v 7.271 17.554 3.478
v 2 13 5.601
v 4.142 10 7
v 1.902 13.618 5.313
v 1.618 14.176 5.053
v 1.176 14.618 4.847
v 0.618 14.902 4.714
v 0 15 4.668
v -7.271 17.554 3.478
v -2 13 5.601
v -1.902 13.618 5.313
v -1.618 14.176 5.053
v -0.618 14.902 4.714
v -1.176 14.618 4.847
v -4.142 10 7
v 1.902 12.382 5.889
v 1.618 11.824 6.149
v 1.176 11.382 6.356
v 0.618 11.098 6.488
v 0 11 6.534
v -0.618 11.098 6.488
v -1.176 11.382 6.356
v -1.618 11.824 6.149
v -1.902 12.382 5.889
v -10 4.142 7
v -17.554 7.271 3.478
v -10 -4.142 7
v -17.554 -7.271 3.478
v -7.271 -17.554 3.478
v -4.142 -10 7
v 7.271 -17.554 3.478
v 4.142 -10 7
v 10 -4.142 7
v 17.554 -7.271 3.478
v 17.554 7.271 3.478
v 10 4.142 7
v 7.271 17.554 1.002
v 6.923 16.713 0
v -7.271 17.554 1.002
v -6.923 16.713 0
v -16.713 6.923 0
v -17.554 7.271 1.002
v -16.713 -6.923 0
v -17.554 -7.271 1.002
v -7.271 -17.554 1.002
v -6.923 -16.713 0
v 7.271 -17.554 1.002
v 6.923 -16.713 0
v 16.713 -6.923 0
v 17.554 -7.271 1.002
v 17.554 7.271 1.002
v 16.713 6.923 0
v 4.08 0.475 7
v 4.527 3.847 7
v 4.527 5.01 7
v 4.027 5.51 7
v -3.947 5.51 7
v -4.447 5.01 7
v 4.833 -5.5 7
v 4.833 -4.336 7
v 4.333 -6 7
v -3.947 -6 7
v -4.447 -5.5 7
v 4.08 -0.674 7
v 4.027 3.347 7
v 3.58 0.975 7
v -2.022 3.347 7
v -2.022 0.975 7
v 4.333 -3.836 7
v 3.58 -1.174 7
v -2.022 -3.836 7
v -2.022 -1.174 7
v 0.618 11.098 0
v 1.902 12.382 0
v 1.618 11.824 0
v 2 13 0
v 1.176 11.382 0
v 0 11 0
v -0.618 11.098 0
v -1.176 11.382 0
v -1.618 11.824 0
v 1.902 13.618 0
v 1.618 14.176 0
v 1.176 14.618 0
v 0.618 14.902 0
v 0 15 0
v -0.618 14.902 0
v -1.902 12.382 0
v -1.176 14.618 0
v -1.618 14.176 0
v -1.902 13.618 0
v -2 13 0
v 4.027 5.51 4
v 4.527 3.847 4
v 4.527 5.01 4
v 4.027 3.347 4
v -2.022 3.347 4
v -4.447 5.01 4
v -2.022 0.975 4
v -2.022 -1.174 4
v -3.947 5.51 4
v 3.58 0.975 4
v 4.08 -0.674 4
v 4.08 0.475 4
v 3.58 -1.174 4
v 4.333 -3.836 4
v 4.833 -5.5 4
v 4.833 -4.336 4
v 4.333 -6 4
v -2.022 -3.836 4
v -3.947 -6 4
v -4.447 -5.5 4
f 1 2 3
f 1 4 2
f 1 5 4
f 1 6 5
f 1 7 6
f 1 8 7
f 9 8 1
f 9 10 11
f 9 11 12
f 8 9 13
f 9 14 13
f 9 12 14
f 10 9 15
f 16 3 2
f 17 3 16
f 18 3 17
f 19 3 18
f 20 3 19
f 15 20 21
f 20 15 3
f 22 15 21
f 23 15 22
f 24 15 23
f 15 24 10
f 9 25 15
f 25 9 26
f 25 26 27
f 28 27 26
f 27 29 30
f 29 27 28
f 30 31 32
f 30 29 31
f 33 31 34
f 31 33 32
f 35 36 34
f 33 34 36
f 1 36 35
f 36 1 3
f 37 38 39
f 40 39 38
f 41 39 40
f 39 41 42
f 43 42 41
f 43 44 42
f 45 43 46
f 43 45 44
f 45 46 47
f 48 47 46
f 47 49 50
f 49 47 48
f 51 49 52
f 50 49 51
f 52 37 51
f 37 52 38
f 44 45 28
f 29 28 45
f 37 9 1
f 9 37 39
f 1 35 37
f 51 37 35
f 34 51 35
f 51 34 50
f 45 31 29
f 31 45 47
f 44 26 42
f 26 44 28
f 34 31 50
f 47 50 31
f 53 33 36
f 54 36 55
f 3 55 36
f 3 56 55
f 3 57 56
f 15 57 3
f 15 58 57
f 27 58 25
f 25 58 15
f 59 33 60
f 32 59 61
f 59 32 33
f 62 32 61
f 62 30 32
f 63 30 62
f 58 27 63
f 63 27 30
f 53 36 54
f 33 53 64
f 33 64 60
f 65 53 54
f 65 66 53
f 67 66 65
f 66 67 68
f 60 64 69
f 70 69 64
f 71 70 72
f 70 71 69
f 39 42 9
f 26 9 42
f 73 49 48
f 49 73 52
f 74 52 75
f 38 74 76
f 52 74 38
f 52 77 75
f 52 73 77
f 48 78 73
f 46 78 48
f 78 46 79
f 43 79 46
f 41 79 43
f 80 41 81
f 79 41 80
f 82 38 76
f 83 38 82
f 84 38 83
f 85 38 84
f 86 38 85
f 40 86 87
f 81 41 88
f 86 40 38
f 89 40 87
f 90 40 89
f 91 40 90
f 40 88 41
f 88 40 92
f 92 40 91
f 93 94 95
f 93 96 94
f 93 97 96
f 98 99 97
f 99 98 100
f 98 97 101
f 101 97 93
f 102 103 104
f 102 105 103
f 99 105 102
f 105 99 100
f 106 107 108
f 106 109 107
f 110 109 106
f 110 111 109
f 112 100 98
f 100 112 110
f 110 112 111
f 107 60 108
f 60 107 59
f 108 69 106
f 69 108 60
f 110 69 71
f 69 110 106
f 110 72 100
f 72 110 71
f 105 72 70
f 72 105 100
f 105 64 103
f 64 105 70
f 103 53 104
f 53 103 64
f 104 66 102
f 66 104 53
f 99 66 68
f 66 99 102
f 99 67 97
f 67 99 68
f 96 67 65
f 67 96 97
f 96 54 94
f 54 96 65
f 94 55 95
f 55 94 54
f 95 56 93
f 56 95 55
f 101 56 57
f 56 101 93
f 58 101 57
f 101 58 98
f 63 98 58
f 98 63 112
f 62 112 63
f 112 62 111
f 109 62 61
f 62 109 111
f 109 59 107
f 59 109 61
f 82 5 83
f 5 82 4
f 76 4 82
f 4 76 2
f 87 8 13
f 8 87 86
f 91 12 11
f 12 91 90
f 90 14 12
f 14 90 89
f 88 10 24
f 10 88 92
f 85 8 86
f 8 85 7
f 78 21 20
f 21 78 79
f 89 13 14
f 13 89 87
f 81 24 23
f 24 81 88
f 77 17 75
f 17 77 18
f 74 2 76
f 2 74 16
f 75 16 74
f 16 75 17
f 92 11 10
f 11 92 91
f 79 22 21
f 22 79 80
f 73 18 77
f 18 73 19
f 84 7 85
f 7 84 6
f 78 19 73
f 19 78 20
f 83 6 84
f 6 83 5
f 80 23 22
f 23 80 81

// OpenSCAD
diam = 38;
height = 7;
crown_diam = 20;

module cuts(slope) {
  for (a = [0:7])
    rotate([0, 0, 360*a/8])
      translate([-diam/2, crown_diam/2, height])
        rotate([-slope, 0, 0])
          cube(diam);
}

difference() {
  rotate([0, 0, 360/16])
    cylinder(h=height, d=diam, $fn=8);

  cuts(25);

  translate([0, 0, height-8])
    scale([1, 1, -1])
      cuts(50);
  
  translate([-5.2, -5.5, height-3])
    linear_extrude(20)
      offset(0.5)
        text("E", size=11);
  
  translate([0, 13, -1])
    cylinder(h=20, d=4, $fn=20);
}
